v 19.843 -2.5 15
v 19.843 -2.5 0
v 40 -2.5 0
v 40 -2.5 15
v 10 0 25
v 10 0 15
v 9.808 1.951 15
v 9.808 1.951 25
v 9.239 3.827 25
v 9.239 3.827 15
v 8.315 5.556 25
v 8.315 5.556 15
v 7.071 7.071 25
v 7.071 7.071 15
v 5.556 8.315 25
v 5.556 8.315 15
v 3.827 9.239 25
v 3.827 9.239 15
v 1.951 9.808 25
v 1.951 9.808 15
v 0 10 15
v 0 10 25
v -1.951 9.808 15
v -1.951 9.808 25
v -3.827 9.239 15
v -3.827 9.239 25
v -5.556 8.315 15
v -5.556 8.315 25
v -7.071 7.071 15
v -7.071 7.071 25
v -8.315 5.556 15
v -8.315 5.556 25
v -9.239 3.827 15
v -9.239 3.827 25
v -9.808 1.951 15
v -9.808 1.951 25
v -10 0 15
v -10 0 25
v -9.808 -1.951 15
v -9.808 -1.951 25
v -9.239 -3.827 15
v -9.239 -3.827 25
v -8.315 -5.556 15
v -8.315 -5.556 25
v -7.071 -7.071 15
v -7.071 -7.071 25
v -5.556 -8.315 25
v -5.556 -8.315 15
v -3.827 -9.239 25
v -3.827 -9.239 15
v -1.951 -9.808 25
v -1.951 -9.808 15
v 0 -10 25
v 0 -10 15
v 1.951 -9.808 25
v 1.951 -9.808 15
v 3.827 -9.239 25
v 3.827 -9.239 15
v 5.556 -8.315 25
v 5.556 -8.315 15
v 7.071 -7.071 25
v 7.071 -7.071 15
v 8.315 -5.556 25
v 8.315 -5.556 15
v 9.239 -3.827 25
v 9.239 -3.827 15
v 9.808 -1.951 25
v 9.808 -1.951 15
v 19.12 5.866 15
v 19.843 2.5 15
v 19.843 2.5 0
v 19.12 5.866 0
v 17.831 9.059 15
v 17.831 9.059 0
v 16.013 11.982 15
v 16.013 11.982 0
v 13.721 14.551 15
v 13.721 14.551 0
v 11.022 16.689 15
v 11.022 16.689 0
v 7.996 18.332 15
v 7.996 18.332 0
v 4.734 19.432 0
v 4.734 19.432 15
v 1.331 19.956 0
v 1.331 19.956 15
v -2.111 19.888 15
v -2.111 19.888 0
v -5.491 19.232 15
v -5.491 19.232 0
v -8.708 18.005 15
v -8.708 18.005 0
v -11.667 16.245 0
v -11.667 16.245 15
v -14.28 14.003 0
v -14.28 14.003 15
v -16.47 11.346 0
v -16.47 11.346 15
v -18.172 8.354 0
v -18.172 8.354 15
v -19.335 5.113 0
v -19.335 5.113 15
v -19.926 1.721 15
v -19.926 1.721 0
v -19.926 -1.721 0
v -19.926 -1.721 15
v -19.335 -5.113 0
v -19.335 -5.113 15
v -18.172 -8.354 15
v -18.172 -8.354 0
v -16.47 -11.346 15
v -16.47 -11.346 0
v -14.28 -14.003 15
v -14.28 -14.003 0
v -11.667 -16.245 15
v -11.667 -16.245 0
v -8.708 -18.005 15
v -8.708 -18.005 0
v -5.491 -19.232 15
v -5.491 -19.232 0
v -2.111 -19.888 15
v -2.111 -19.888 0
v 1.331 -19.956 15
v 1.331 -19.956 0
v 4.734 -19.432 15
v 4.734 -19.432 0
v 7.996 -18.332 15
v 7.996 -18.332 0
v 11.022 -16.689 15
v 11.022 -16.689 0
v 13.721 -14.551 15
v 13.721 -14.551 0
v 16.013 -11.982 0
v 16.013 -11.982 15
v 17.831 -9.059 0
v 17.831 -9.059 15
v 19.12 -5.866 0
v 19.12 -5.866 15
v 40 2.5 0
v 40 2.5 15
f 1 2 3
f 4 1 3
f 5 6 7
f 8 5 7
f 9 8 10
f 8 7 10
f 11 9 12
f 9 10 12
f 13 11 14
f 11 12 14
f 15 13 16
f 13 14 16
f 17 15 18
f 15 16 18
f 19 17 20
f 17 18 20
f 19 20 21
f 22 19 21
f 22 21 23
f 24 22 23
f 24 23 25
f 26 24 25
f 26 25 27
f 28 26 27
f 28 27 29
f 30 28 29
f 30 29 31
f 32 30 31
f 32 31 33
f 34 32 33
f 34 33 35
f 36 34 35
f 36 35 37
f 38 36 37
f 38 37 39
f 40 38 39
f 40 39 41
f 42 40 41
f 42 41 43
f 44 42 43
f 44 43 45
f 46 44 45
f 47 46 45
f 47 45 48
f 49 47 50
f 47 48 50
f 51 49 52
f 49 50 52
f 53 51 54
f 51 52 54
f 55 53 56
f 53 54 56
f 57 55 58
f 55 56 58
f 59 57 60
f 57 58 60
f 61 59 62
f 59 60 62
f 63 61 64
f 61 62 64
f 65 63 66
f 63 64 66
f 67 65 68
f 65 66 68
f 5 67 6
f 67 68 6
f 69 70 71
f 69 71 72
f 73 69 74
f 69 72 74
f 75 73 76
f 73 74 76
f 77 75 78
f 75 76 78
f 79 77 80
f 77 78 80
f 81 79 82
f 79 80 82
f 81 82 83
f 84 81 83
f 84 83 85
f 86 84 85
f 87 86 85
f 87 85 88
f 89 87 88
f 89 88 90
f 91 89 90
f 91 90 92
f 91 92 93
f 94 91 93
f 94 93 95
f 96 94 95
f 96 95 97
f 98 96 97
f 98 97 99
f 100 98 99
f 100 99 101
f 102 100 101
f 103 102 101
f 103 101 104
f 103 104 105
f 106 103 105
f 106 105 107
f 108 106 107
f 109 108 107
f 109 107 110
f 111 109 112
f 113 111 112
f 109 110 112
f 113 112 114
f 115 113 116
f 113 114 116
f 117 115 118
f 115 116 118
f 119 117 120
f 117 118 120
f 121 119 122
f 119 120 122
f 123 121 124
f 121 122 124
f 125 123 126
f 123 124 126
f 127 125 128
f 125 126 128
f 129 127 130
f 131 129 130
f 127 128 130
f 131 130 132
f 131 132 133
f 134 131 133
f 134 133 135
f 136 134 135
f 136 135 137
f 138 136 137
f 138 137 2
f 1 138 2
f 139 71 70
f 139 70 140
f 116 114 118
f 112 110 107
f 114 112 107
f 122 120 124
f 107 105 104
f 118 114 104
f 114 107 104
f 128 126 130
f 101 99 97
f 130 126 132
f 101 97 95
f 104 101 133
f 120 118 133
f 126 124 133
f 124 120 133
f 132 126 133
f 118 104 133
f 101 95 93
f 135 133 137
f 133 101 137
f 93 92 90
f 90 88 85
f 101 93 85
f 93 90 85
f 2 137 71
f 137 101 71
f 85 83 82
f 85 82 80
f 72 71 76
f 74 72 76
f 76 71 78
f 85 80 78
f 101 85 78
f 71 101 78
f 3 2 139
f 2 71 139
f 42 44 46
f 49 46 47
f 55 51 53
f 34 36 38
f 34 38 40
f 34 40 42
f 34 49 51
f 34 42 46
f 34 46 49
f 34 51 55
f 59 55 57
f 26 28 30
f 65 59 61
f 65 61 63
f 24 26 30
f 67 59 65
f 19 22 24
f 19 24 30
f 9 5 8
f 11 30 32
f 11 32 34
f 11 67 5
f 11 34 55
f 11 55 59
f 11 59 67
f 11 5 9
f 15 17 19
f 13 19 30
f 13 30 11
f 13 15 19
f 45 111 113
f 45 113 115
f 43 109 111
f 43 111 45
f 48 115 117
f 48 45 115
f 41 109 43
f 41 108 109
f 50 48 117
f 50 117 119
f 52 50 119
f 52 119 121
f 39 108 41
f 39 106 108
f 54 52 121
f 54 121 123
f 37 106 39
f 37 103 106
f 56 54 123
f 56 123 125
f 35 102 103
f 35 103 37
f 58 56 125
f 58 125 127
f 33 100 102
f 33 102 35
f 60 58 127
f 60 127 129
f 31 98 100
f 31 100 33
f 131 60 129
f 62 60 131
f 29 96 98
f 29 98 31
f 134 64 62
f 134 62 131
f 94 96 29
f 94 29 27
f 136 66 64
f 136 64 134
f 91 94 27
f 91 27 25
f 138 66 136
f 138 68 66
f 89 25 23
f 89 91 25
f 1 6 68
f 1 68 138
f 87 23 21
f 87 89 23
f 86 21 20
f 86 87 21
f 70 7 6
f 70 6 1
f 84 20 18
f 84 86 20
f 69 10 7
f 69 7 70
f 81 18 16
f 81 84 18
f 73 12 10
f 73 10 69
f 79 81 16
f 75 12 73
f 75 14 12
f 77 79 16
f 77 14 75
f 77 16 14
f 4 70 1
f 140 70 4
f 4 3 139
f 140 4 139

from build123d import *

# Parameters (mm, degrees)
F0_R     = 20
F1_DEPTH = 15
F2_W     = 40
F2_H     = 2.5
F3_DEPTH = 15
F4_R     = 10
F5_DEPTH = 25


with BuildPart() as f1:
    # F0 (on Top) → F1 (new body)
    with BuildSketch(Plane.XY):
        Circle(F0_R)
    extrude(amount=F1_DEPTH)

    # F2 (on Top) → F3 (join)
    with BuildSketch(Plane.XY):
        with Locations((20, 1.25)):
            Rectangle(F2_W, F2_H)
        with Locations((20, -1.25)):
            Rectangle(F2_W, F2_H)
    extrude(amount=F3_DEPTH)

    # F4 (on Top) → F5 (join)
    with BuildSketch(Plane.XY):
        Circle(F4_R)
    extrude(amount=F5_DEPTH)


solid = f1.part
